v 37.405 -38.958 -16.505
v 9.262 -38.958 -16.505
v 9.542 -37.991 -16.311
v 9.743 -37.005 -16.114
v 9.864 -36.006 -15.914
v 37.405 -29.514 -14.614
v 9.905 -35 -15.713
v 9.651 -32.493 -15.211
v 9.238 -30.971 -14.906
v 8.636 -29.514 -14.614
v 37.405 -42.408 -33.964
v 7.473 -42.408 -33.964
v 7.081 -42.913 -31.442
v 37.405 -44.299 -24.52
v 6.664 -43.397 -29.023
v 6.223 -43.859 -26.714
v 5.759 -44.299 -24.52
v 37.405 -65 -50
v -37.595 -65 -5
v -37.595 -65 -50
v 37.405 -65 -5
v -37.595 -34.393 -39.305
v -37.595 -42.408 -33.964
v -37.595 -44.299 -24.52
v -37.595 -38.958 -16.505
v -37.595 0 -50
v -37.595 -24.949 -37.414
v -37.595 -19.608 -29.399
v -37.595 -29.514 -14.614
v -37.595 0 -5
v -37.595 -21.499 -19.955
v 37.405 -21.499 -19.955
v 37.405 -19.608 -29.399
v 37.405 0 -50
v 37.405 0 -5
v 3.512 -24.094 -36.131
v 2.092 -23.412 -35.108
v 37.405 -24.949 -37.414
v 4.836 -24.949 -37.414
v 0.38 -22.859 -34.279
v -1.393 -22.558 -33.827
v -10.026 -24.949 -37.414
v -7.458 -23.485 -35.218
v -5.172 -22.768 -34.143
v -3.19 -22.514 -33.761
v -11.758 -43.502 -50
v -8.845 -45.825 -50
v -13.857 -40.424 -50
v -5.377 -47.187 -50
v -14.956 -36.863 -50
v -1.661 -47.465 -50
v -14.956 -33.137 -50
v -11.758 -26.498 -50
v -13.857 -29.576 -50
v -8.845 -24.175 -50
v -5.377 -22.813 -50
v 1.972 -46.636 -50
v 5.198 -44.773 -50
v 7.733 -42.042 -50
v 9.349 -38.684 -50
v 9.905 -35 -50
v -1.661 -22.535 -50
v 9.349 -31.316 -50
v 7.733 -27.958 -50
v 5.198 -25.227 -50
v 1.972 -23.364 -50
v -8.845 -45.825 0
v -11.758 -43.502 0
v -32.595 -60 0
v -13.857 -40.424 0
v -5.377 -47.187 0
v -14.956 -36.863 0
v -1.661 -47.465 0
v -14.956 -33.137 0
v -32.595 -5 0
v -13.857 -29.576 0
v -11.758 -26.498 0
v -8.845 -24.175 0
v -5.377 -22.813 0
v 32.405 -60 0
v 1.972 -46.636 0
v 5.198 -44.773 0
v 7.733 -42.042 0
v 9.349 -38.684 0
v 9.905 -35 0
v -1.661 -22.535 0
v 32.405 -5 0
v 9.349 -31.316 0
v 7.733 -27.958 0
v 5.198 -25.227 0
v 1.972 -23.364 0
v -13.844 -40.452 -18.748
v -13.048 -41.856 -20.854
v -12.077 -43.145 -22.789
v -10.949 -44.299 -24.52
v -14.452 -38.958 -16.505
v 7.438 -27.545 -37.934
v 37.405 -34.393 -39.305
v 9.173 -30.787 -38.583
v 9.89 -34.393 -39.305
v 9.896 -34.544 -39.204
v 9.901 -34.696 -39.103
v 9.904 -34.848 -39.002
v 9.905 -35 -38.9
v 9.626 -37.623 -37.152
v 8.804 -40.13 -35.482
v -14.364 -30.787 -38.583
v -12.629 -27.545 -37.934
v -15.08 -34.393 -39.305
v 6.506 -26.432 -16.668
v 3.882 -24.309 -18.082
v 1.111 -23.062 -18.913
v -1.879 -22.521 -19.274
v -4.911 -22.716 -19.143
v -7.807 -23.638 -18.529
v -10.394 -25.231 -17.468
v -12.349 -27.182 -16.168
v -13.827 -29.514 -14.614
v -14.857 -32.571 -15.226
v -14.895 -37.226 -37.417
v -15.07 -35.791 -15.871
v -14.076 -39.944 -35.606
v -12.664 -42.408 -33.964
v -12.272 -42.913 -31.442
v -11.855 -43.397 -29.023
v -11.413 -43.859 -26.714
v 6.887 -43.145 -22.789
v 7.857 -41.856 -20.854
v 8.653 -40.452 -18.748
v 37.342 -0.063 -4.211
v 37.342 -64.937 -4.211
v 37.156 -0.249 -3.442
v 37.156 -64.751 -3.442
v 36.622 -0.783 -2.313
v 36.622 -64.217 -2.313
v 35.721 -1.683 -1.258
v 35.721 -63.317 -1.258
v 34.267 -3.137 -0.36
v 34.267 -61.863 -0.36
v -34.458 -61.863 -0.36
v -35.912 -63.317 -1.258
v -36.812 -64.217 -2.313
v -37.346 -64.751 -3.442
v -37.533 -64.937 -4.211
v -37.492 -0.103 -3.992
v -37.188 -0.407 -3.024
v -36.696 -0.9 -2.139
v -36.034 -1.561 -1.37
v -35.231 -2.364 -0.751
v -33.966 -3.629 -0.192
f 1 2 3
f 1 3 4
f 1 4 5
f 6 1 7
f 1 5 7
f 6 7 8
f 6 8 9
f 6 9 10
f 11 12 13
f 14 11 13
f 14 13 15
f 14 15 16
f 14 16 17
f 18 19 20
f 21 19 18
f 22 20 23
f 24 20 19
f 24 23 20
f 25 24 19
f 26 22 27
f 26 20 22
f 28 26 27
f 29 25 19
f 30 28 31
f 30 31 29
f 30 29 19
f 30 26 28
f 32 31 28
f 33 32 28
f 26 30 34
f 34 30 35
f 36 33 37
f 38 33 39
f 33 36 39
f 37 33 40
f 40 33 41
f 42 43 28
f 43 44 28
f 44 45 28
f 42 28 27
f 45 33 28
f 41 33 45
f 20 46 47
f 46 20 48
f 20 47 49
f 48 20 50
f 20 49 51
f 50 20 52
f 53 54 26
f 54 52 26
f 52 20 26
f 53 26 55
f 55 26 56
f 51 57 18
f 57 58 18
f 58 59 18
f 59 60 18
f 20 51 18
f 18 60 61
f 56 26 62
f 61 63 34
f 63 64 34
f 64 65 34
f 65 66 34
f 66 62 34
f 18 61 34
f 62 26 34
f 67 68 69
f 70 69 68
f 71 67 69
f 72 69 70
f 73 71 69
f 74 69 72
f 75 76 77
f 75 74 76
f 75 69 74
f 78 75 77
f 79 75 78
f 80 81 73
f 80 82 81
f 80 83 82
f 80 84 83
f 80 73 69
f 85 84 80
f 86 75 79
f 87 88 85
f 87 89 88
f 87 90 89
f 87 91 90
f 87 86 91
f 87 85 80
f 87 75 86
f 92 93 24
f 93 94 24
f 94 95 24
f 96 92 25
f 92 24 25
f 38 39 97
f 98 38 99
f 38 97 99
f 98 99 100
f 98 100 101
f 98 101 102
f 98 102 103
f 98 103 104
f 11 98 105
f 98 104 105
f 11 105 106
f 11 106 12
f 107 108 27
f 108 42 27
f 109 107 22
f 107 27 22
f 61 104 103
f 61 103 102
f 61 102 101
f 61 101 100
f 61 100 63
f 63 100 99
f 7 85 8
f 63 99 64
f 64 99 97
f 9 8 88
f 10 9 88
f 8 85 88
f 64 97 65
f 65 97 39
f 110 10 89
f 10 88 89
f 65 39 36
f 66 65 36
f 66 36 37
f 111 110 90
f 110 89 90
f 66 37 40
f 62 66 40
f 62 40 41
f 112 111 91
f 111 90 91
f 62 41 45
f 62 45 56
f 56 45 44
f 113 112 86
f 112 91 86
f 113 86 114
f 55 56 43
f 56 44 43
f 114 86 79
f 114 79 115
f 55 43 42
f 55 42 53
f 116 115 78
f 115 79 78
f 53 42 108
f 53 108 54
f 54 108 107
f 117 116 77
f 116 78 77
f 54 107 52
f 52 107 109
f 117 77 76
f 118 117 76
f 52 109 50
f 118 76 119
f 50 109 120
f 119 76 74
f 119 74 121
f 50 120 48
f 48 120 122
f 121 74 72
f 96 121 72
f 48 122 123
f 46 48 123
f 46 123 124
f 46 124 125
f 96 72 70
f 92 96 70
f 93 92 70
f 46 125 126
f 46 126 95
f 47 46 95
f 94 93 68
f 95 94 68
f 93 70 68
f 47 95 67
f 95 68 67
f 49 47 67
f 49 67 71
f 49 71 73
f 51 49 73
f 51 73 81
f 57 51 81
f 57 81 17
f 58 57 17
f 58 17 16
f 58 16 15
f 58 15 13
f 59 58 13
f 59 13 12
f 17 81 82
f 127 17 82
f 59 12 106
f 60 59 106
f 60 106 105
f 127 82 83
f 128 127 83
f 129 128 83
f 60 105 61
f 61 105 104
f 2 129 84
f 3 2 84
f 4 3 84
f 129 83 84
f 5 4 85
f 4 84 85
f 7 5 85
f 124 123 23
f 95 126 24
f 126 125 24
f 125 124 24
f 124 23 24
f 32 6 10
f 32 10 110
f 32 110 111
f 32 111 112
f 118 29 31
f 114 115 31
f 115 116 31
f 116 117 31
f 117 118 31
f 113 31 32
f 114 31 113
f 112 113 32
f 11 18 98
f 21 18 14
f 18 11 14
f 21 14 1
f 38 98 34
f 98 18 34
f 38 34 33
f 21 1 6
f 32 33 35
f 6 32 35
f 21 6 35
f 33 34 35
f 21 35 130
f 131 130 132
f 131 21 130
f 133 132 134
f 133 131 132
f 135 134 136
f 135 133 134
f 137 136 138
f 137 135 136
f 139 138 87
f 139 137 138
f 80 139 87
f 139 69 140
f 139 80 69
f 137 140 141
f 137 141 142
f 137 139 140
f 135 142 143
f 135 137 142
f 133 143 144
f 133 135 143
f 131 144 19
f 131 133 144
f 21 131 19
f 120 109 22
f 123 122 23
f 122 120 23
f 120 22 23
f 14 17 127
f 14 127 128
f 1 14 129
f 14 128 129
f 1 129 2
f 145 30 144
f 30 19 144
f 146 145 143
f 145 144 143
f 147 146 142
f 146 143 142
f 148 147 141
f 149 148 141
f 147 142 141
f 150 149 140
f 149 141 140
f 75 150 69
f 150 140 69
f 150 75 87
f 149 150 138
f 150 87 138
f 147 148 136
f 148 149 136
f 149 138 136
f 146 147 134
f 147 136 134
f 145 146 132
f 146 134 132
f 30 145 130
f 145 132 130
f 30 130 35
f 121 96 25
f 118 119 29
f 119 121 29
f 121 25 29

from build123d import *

# Parameters (mm, degrees)
F0_W     = 75
F0_H     = 50
F1_DEPTH = 65
F2_R     = 5
F3_R     = 12.5
F4_DEPTH = 50.001
F6_DEPTH = 75.001


with BuildPart() as f1:
    # F0 (on Front) → F1 (new body)
    with BuildSketch(Plane.XZ):
        with Locations((-0.09526, -25)):
            Rectangle(F0_W, F0_H)
    extrude(amount=F1_DEPTH)

    # F2
    f2_edges = [f1.edges().sort_by_distance(p)[0] for p in [
        (-0.09526, -65, 0),
        (-37.59526, -32.5, 0),
        (-0.09526, 0, 0),
        (37.40474, -32.5, 0),
    ]]
    fillet(f2_edges, radius=F2_R)

    # F3 (on face) → F4 (cut, through all)
    with BuildSketch(Plane.XY):
        with Locations((-2.59526, -35)):
            Circle(F3_R)
    extrude(amount=-F4_DEPTH, mode=Mode.SUBTRACT)

    # F5 (on face) → F6 (cut, through all)
    with BuildSketch(Plane(origin=(-37.59526, 0, 0), x_dir=(0, -1, 0), z_dir=(-1, 0, 0))):
        Polygon((34.392635, -39.305133), (42.407697, -33.964212), (44.2986, -24.520106), (38.957679, -16.505044), (29.513573, -14.614141), (21.498511, -19.955062), (19.607608, -29.399168), (24.948529, -37.41423), align=None)
    extrude(amount=-F6_DEPTH, mode=Mode.SUBTRACT)


solid = f1.part
